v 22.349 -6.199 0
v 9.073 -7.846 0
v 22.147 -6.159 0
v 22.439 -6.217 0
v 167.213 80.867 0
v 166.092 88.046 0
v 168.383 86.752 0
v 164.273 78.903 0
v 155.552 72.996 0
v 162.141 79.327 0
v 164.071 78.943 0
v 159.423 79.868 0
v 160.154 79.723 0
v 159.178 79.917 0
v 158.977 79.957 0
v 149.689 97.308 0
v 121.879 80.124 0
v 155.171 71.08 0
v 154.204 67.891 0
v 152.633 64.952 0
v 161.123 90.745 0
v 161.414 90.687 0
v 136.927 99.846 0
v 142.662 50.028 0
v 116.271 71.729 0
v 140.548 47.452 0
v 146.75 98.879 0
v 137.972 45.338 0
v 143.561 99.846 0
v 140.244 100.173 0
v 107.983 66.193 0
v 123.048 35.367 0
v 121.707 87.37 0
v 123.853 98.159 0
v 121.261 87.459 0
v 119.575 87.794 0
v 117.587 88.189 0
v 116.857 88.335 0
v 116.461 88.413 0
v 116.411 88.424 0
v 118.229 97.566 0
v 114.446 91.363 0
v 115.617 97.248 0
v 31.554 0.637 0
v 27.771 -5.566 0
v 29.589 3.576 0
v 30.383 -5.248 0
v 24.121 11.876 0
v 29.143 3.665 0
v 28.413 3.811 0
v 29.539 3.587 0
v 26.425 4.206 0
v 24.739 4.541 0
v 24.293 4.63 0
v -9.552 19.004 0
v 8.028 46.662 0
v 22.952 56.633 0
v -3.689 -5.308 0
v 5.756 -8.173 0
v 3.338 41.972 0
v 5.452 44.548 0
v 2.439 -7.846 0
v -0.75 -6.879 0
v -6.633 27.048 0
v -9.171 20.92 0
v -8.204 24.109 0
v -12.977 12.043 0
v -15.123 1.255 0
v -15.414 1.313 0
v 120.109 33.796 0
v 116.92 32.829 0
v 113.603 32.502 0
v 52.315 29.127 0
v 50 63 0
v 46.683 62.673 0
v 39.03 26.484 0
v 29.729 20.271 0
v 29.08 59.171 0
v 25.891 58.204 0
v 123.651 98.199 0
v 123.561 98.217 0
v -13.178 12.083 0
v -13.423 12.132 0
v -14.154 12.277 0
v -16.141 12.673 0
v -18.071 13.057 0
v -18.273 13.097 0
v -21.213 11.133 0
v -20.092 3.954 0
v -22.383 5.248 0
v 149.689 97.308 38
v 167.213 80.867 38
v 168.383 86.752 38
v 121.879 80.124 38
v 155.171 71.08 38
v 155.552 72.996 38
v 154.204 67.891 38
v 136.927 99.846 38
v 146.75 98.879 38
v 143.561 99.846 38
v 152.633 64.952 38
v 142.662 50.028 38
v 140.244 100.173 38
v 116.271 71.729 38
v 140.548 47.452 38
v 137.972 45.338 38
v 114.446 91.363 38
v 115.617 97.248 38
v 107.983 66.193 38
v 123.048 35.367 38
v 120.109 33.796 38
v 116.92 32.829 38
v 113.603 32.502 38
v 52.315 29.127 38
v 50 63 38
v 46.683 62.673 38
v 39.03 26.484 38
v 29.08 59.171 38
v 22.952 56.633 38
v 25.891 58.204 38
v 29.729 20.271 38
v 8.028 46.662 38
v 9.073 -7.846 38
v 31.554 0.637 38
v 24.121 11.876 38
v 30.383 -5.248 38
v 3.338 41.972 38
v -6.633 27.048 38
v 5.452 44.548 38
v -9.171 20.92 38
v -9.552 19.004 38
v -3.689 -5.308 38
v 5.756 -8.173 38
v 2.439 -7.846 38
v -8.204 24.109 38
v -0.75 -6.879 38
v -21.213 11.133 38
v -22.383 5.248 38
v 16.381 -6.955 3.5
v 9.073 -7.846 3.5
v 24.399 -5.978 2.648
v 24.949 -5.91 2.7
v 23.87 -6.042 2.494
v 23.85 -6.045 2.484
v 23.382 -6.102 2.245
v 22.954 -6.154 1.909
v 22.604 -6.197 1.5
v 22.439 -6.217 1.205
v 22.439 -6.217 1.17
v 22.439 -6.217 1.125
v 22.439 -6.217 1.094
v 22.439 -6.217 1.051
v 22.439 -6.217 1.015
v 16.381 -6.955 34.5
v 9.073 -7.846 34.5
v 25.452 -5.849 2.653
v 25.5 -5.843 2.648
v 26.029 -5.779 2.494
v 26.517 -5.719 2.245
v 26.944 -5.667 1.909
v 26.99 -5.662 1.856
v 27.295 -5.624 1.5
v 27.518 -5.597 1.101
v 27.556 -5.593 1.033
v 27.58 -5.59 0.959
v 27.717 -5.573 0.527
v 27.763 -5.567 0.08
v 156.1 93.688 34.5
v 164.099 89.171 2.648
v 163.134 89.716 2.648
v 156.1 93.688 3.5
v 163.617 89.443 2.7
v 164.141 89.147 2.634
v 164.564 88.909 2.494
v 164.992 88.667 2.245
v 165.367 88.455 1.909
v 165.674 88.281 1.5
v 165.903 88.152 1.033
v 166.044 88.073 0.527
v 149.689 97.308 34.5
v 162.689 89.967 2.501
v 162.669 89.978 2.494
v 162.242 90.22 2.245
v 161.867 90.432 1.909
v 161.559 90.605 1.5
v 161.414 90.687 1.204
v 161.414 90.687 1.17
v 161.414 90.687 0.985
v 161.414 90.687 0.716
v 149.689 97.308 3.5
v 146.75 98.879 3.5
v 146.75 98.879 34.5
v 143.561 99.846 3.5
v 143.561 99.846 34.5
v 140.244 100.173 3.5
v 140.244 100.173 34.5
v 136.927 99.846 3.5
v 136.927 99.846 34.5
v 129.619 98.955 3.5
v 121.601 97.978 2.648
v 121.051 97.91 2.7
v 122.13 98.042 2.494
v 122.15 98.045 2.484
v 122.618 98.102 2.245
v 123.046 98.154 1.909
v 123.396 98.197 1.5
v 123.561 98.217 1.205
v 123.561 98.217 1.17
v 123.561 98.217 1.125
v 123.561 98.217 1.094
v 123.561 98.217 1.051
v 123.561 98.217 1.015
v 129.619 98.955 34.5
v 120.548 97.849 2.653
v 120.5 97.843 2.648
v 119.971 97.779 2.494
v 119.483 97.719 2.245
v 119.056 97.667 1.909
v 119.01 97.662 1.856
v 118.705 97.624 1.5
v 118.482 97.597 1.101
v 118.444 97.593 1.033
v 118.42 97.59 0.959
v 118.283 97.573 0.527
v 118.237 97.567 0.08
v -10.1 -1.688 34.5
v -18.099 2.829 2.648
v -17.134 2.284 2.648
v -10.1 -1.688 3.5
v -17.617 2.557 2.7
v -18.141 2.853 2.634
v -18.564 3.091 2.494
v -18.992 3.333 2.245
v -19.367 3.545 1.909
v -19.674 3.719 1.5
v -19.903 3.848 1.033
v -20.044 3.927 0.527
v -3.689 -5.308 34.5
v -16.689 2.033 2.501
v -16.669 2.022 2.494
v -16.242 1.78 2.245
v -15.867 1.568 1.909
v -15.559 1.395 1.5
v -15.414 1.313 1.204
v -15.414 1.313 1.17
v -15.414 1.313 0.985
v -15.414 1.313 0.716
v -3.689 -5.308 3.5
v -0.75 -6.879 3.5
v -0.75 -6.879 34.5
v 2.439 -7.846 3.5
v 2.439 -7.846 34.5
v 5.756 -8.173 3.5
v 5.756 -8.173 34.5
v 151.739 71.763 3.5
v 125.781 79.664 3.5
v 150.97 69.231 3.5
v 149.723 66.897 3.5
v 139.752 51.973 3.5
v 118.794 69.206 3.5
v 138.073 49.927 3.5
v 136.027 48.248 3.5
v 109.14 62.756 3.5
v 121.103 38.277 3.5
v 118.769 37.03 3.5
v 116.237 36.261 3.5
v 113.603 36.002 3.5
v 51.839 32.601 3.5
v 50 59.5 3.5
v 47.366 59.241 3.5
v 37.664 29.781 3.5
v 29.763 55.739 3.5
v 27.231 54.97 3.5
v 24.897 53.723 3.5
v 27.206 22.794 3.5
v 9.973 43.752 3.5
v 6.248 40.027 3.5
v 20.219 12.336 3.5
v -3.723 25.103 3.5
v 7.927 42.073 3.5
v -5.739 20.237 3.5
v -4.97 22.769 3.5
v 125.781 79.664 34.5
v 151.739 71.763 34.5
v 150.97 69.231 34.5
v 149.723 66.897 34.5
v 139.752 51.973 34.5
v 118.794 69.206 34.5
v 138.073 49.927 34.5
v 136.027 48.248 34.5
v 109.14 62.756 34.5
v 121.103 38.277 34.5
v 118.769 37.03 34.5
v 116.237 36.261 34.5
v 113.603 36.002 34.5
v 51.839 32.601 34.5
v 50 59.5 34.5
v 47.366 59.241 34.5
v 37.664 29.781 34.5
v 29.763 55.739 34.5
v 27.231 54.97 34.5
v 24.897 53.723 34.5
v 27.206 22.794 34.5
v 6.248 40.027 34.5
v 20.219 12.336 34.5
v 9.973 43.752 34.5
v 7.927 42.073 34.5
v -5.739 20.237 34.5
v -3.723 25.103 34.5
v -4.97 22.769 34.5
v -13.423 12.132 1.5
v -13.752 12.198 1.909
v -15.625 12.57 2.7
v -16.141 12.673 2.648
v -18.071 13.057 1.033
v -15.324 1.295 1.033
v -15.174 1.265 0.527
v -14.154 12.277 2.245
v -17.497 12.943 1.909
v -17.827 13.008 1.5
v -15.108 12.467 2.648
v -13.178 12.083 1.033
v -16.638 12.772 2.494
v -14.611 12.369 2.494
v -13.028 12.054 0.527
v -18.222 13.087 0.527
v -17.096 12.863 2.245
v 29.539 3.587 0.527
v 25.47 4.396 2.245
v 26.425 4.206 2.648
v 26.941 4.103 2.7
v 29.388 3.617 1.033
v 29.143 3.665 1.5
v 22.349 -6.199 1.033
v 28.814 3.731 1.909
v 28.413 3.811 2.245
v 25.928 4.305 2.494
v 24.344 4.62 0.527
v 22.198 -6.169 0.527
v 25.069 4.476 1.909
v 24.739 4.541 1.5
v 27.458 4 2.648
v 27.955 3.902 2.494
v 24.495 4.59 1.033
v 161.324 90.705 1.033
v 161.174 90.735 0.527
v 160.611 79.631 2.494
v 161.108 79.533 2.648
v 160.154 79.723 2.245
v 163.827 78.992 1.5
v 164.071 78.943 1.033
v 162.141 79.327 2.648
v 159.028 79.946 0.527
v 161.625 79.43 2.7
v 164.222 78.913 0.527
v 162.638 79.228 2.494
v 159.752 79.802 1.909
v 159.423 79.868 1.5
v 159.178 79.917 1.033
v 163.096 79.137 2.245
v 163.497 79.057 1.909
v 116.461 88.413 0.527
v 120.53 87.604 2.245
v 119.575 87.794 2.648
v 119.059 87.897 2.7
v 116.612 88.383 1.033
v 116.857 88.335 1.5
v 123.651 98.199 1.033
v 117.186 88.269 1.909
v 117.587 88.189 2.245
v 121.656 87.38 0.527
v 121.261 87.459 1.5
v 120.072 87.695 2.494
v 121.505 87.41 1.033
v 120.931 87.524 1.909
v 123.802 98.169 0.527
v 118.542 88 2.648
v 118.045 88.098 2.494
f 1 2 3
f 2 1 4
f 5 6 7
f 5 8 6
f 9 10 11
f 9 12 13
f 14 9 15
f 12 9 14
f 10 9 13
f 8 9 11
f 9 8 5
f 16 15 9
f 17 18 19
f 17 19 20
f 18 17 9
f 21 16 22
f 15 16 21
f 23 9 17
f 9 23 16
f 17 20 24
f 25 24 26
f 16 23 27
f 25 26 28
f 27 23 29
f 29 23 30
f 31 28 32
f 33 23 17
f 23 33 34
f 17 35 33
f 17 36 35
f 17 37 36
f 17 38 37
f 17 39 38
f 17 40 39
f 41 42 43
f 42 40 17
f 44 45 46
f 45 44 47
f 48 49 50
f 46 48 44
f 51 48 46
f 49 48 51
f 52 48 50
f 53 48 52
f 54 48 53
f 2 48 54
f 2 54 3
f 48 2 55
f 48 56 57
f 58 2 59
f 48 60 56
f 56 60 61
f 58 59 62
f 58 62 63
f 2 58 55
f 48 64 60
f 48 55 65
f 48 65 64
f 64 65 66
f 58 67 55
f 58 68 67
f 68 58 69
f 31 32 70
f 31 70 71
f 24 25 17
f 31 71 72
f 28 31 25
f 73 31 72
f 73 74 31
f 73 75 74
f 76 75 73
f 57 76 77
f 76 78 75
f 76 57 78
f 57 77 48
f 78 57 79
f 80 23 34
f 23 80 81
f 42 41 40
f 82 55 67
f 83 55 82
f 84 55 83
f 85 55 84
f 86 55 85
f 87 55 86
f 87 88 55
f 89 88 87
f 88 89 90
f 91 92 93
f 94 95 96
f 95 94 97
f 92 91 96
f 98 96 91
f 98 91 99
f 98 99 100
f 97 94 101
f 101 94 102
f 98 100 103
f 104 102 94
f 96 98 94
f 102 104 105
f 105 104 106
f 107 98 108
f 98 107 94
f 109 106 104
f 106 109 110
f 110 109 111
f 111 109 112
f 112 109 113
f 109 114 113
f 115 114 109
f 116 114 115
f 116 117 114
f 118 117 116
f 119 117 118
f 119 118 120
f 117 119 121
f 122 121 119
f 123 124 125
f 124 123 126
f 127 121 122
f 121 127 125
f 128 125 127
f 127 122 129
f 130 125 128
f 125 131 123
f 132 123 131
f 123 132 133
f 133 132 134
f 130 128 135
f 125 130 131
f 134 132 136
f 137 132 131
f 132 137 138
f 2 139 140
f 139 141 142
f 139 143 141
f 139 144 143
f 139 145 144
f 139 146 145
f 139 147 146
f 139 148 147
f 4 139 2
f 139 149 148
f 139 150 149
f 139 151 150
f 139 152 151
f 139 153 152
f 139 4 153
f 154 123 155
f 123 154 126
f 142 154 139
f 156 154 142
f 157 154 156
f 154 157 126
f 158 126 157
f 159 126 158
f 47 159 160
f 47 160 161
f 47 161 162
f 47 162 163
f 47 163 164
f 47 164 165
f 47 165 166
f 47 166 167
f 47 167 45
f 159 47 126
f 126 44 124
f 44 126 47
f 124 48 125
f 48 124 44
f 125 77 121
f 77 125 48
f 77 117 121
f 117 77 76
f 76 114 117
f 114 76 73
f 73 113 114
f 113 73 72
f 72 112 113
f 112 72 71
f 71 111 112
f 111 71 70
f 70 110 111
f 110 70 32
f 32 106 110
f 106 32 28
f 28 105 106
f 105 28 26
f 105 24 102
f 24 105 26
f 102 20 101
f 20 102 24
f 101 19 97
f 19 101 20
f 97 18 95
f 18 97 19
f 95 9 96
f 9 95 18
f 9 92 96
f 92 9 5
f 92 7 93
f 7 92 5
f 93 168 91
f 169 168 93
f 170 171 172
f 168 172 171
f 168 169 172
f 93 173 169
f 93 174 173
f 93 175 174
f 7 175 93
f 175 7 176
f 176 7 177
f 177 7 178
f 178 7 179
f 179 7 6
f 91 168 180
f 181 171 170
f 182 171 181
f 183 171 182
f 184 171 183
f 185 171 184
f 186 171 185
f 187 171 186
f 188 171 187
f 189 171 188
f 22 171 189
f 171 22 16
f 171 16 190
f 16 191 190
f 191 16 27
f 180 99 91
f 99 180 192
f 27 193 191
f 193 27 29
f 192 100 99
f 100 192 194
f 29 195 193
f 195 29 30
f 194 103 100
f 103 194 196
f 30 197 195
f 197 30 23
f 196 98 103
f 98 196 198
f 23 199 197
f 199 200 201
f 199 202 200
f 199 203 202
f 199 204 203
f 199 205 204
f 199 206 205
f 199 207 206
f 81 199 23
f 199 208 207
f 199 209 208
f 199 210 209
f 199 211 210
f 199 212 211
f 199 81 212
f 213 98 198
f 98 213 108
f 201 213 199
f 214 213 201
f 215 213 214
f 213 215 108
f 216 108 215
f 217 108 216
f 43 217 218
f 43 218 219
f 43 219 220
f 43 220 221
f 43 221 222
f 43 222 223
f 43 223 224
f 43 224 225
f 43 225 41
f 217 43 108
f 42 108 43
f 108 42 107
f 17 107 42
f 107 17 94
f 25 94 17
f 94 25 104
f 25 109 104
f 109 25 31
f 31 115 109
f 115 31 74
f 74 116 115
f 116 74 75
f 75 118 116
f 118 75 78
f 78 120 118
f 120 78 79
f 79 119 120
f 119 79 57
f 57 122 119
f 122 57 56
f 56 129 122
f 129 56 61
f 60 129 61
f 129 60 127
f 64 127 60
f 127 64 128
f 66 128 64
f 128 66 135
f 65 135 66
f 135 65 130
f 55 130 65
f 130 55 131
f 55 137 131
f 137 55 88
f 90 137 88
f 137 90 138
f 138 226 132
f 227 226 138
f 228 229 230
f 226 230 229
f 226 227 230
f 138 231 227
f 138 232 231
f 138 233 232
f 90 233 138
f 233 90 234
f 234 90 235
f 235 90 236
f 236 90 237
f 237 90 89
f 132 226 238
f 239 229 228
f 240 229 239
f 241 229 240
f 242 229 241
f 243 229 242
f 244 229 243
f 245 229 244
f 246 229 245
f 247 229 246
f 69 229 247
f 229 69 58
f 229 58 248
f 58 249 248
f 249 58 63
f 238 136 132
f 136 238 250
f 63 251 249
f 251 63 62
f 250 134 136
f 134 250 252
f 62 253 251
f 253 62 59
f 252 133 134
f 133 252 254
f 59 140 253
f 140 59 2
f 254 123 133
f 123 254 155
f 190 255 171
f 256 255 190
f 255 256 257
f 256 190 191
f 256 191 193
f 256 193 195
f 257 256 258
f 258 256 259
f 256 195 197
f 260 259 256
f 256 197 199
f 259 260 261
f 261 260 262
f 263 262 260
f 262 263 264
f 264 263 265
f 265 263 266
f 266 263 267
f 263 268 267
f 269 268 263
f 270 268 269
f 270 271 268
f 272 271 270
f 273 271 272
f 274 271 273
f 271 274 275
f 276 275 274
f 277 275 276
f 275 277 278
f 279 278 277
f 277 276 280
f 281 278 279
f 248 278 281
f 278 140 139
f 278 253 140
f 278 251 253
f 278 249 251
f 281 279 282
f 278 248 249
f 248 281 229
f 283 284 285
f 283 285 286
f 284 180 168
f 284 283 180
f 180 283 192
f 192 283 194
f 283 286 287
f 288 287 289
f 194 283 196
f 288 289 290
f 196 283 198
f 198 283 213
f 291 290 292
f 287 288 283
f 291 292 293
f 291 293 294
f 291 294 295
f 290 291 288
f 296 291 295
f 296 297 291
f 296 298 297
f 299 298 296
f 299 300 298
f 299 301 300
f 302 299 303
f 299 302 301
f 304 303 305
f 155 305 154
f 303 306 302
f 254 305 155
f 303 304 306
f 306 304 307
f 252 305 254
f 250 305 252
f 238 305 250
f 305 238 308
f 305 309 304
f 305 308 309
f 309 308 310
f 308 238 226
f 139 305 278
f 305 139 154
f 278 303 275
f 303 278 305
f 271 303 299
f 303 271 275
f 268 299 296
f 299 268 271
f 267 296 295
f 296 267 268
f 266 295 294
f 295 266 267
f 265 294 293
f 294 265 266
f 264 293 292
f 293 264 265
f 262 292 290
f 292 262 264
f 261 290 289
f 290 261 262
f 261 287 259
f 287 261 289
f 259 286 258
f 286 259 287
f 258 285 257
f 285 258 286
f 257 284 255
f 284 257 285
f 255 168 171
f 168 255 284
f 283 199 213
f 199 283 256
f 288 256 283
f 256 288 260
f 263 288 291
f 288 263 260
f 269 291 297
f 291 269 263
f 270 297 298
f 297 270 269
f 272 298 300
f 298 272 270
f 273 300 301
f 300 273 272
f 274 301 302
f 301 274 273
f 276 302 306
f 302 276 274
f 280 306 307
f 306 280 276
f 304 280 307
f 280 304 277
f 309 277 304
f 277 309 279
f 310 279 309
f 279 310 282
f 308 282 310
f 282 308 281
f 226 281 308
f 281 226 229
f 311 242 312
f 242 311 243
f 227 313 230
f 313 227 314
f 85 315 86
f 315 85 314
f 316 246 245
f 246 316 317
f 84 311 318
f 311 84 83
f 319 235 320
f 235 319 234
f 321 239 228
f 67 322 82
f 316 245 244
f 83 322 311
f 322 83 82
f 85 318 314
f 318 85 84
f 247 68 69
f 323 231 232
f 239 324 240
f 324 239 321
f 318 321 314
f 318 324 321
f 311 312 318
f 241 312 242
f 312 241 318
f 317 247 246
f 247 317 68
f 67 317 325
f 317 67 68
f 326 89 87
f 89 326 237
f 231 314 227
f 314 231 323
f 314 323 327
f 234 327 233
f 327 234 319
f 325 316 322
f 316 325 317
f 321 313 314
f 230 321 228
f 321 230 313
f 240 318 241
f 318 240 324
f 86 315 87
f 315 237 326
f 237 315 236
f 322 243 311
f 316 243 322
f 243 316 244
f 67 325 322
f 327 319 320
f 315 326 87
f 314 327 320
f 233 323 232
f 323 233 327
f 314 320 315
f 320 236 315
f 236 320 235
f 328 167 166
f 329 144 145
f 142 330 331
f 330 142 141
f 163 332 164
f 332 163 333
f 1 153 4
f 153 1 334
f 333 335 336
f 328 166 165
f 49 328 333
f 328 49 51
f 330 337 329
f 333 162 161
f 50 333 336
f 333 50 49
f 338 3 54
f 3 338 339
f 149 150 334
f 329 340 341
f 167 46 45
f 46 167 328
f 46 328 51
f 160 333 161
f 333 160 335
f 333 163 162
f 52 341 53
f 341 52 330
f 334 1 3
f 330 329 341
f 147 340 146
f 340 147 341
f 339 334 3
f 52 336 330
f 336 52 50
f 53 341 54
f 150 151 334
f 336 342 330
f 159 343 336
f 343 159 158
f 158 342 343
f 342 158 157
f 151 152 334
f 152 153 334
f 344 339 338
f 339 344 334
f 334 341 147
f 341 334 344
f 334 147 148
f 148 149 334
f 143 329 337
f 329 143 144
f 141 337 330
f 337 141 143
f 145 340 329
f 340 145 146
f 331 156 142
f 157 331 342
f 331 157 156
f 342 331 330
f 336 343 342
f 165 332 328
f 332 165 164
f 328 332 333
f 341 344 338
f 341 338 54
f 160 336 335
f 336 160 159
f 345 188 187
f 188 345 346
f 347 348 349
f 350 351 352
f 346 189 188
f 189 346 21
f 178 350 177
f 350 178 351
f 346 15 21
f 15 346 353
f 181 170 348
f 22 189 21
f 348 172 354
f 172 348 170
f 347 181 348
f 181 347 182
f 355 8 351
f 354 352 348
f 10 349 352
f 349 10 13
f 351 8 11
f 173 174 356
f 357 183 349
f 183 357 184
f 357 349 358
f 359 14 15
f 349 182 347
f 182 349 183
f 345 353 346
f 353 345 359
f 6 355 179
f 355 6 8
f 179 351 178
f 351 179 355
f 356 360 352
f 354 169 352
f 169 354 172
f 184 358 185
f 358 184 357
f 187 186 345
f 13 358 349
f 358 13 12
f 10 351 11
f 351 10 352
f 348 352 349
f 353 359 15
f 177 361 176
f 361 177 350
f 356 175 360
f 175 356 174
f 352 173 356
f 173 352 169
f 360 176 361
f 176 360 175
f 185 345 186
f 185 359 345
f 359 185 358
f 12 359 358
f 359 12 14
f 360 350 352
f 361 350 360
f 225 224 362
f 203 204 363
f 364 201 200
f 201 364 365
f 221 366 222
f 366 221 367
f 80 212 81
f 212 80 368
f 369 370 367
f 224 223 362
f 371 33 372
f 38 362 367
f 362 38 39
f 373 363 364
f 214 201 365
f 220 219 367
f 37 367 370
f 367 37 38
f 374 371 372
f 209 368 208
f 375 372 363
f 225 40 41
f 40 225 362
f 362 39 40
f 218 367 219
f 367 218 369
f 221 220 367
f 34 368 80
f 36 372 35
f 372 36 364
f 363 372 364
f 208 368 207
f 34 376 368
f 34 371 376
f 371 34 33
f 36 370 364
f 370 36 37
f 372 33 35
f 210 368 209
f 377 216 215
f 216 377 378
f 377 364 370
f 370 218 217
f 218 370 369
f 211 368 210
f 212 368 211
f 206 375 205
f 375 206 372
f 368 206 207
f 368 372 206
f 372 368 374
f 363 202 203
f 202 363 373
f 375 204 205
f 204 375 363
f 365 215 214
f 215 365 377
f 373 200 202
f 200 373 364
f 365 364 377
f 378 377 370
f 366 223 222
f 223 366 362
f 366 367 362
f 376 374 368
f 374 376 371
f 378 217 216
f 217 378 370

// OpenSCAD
$fn = 32;

// ----------------------------------------------------------------------
// Air duct: 34 mm duct, 3.5 mm wall, 38 mm across
// ----------------------------------------------------------------------

// --- parameters (mm) ---
duct_r = 17;              // duct core radius
duct_d = 34;              // duct core diameter
wall = 3.5;               // duct wall thickness
height = 38;              // duct width (extrusion height)
port_r = 26.9;            // port flange half width
port_d = 53.8;            // port flange width
port_t = 6;               // port flange thickness
bolt_d = 5.4;             // port bolt holes
bolt_offset = 21.7;       // bolt hole offset from the port axis

difference() {
  /* outer hull chain: tube with a flat flange plate at every port */
  linear_extrude(height = 38) {
    hull() {
      polygon([[30.383, -5.248], [-22.383, 5.248], [-21.213, 11.133], [31.554, 0.637]]);
      translate([5.756, 8.827]) circle(r = 17);
    }
    hull() {
      translate([5.756, 8.827]) circle(r = 17);
      translate([7.502, 17.603]) circle(r = 17);
    }
    hull() {
      translate([7.502, 17.603]) circle(r = 17);
      translate([17.473, 32.527]) circle(r = 17);
    }
    hull() {
      translate([17.473, 32.527]) circle(r = 17);
      translate([32.397, 42.498]) circle(r = 17);
    }
    hull() {
      translate([32.397, 42.498]) circle(r = 17);
      translate([50, 46]) circle(r = 17);
    }
    hull() {
      translate([50, 46]) circle(r = 17);
      translate([113.603, 49.502]) circle(r = 17);
    }
    hull() {
      translate([113.603, 49.502]) circle(r = 17);
      translate([128.527, 59.473]) circle(r = 17);
    }
    hull() {
      translate([128.527, 59.473]) circle(r = 17);
      translate([138.498, 74.397]) circle(r = 17);
    }
    hull() {
      translate([138.498, 74.397]) circle(r = 17);
      translate([140.244, 83.173]) circle(r = 17);
    }
    hull() {
      translate([140.244, 83.173]) circle(r = 17);
      polygon([[115.617, 97.248], [168.383, 86.752], [167.213, 80.867], [114.446, 91.363]]);
    }
  }
  /* air passage: the same chain inset by the wall, 5 mm proud of the ports */
  translate([0, 0, 3.5]) linear_extrude(height = 31) {
    hull() {
      translate([3.025, -4.904]) circle(r = 13.5);
      translate([7.502, 17.603]) circle(r = 13.5);
    }
    hull() {
      translate([7.502, 17.603]) circle(r = 13.5);
      translate([17.473, 32.527]) circle(r = 13.5);
    }
    hull() {
      translate([17.473, 32.527]) circle(r = 13.5);
      translate([32.397, 42.498]) circle(r = 13.5);
    }
    hull() {
      translate([32.397, 42.498]) circle(r = 13.5);
      translate([50, 46]) circle(r = 13.5);
    }
    hull() {
      translate([50, 46]) circle(r = 13.5);
      translate([113.603, 49.502]) circle(r = 13.5);
    }
    hull() {
      translate([113.603, 49.502]) circle(r = 13.5);
      translate([128.527, 59.473]) circle(r = 13.5);
    }
    hull() {
      translate([128.527, 59.473]) circle(r = 13.5);
      translate([138.498, 74.397]) circle(r = 13.5);
    }
    hull() {
      translate([138.498, 74.397]) circle(r = 13.5);
      translate([142.975, 96.904]) circle(r = 13.5);
    }
  }
  translate([4, 0]) rotate([0, 0, -11.25]) translate([-21.7, -2.5]) rotate([-90, 0, 0]) cylinder(h = 11, d = 5.4);
  translate([4, 0]) rotate([0, 0, -11.25]) translate([21.7, -2.5]) rotate([-90, 0, 0]) cylinder(h = 11, d = 5.4);
  translate([142, 92]) rotate([0, 0, 168.75]) translate([-21.7, -2.5]) rotate([-90, 0, 0]) cylinder(h = 11, d = 5.4);
  translate([142, 92]) rotate([0, 0, 168.75]) translate([21.7, -2.5]) rotate([-90, 0, 0]) cylinder(h = 11, d = 5.4);
}
